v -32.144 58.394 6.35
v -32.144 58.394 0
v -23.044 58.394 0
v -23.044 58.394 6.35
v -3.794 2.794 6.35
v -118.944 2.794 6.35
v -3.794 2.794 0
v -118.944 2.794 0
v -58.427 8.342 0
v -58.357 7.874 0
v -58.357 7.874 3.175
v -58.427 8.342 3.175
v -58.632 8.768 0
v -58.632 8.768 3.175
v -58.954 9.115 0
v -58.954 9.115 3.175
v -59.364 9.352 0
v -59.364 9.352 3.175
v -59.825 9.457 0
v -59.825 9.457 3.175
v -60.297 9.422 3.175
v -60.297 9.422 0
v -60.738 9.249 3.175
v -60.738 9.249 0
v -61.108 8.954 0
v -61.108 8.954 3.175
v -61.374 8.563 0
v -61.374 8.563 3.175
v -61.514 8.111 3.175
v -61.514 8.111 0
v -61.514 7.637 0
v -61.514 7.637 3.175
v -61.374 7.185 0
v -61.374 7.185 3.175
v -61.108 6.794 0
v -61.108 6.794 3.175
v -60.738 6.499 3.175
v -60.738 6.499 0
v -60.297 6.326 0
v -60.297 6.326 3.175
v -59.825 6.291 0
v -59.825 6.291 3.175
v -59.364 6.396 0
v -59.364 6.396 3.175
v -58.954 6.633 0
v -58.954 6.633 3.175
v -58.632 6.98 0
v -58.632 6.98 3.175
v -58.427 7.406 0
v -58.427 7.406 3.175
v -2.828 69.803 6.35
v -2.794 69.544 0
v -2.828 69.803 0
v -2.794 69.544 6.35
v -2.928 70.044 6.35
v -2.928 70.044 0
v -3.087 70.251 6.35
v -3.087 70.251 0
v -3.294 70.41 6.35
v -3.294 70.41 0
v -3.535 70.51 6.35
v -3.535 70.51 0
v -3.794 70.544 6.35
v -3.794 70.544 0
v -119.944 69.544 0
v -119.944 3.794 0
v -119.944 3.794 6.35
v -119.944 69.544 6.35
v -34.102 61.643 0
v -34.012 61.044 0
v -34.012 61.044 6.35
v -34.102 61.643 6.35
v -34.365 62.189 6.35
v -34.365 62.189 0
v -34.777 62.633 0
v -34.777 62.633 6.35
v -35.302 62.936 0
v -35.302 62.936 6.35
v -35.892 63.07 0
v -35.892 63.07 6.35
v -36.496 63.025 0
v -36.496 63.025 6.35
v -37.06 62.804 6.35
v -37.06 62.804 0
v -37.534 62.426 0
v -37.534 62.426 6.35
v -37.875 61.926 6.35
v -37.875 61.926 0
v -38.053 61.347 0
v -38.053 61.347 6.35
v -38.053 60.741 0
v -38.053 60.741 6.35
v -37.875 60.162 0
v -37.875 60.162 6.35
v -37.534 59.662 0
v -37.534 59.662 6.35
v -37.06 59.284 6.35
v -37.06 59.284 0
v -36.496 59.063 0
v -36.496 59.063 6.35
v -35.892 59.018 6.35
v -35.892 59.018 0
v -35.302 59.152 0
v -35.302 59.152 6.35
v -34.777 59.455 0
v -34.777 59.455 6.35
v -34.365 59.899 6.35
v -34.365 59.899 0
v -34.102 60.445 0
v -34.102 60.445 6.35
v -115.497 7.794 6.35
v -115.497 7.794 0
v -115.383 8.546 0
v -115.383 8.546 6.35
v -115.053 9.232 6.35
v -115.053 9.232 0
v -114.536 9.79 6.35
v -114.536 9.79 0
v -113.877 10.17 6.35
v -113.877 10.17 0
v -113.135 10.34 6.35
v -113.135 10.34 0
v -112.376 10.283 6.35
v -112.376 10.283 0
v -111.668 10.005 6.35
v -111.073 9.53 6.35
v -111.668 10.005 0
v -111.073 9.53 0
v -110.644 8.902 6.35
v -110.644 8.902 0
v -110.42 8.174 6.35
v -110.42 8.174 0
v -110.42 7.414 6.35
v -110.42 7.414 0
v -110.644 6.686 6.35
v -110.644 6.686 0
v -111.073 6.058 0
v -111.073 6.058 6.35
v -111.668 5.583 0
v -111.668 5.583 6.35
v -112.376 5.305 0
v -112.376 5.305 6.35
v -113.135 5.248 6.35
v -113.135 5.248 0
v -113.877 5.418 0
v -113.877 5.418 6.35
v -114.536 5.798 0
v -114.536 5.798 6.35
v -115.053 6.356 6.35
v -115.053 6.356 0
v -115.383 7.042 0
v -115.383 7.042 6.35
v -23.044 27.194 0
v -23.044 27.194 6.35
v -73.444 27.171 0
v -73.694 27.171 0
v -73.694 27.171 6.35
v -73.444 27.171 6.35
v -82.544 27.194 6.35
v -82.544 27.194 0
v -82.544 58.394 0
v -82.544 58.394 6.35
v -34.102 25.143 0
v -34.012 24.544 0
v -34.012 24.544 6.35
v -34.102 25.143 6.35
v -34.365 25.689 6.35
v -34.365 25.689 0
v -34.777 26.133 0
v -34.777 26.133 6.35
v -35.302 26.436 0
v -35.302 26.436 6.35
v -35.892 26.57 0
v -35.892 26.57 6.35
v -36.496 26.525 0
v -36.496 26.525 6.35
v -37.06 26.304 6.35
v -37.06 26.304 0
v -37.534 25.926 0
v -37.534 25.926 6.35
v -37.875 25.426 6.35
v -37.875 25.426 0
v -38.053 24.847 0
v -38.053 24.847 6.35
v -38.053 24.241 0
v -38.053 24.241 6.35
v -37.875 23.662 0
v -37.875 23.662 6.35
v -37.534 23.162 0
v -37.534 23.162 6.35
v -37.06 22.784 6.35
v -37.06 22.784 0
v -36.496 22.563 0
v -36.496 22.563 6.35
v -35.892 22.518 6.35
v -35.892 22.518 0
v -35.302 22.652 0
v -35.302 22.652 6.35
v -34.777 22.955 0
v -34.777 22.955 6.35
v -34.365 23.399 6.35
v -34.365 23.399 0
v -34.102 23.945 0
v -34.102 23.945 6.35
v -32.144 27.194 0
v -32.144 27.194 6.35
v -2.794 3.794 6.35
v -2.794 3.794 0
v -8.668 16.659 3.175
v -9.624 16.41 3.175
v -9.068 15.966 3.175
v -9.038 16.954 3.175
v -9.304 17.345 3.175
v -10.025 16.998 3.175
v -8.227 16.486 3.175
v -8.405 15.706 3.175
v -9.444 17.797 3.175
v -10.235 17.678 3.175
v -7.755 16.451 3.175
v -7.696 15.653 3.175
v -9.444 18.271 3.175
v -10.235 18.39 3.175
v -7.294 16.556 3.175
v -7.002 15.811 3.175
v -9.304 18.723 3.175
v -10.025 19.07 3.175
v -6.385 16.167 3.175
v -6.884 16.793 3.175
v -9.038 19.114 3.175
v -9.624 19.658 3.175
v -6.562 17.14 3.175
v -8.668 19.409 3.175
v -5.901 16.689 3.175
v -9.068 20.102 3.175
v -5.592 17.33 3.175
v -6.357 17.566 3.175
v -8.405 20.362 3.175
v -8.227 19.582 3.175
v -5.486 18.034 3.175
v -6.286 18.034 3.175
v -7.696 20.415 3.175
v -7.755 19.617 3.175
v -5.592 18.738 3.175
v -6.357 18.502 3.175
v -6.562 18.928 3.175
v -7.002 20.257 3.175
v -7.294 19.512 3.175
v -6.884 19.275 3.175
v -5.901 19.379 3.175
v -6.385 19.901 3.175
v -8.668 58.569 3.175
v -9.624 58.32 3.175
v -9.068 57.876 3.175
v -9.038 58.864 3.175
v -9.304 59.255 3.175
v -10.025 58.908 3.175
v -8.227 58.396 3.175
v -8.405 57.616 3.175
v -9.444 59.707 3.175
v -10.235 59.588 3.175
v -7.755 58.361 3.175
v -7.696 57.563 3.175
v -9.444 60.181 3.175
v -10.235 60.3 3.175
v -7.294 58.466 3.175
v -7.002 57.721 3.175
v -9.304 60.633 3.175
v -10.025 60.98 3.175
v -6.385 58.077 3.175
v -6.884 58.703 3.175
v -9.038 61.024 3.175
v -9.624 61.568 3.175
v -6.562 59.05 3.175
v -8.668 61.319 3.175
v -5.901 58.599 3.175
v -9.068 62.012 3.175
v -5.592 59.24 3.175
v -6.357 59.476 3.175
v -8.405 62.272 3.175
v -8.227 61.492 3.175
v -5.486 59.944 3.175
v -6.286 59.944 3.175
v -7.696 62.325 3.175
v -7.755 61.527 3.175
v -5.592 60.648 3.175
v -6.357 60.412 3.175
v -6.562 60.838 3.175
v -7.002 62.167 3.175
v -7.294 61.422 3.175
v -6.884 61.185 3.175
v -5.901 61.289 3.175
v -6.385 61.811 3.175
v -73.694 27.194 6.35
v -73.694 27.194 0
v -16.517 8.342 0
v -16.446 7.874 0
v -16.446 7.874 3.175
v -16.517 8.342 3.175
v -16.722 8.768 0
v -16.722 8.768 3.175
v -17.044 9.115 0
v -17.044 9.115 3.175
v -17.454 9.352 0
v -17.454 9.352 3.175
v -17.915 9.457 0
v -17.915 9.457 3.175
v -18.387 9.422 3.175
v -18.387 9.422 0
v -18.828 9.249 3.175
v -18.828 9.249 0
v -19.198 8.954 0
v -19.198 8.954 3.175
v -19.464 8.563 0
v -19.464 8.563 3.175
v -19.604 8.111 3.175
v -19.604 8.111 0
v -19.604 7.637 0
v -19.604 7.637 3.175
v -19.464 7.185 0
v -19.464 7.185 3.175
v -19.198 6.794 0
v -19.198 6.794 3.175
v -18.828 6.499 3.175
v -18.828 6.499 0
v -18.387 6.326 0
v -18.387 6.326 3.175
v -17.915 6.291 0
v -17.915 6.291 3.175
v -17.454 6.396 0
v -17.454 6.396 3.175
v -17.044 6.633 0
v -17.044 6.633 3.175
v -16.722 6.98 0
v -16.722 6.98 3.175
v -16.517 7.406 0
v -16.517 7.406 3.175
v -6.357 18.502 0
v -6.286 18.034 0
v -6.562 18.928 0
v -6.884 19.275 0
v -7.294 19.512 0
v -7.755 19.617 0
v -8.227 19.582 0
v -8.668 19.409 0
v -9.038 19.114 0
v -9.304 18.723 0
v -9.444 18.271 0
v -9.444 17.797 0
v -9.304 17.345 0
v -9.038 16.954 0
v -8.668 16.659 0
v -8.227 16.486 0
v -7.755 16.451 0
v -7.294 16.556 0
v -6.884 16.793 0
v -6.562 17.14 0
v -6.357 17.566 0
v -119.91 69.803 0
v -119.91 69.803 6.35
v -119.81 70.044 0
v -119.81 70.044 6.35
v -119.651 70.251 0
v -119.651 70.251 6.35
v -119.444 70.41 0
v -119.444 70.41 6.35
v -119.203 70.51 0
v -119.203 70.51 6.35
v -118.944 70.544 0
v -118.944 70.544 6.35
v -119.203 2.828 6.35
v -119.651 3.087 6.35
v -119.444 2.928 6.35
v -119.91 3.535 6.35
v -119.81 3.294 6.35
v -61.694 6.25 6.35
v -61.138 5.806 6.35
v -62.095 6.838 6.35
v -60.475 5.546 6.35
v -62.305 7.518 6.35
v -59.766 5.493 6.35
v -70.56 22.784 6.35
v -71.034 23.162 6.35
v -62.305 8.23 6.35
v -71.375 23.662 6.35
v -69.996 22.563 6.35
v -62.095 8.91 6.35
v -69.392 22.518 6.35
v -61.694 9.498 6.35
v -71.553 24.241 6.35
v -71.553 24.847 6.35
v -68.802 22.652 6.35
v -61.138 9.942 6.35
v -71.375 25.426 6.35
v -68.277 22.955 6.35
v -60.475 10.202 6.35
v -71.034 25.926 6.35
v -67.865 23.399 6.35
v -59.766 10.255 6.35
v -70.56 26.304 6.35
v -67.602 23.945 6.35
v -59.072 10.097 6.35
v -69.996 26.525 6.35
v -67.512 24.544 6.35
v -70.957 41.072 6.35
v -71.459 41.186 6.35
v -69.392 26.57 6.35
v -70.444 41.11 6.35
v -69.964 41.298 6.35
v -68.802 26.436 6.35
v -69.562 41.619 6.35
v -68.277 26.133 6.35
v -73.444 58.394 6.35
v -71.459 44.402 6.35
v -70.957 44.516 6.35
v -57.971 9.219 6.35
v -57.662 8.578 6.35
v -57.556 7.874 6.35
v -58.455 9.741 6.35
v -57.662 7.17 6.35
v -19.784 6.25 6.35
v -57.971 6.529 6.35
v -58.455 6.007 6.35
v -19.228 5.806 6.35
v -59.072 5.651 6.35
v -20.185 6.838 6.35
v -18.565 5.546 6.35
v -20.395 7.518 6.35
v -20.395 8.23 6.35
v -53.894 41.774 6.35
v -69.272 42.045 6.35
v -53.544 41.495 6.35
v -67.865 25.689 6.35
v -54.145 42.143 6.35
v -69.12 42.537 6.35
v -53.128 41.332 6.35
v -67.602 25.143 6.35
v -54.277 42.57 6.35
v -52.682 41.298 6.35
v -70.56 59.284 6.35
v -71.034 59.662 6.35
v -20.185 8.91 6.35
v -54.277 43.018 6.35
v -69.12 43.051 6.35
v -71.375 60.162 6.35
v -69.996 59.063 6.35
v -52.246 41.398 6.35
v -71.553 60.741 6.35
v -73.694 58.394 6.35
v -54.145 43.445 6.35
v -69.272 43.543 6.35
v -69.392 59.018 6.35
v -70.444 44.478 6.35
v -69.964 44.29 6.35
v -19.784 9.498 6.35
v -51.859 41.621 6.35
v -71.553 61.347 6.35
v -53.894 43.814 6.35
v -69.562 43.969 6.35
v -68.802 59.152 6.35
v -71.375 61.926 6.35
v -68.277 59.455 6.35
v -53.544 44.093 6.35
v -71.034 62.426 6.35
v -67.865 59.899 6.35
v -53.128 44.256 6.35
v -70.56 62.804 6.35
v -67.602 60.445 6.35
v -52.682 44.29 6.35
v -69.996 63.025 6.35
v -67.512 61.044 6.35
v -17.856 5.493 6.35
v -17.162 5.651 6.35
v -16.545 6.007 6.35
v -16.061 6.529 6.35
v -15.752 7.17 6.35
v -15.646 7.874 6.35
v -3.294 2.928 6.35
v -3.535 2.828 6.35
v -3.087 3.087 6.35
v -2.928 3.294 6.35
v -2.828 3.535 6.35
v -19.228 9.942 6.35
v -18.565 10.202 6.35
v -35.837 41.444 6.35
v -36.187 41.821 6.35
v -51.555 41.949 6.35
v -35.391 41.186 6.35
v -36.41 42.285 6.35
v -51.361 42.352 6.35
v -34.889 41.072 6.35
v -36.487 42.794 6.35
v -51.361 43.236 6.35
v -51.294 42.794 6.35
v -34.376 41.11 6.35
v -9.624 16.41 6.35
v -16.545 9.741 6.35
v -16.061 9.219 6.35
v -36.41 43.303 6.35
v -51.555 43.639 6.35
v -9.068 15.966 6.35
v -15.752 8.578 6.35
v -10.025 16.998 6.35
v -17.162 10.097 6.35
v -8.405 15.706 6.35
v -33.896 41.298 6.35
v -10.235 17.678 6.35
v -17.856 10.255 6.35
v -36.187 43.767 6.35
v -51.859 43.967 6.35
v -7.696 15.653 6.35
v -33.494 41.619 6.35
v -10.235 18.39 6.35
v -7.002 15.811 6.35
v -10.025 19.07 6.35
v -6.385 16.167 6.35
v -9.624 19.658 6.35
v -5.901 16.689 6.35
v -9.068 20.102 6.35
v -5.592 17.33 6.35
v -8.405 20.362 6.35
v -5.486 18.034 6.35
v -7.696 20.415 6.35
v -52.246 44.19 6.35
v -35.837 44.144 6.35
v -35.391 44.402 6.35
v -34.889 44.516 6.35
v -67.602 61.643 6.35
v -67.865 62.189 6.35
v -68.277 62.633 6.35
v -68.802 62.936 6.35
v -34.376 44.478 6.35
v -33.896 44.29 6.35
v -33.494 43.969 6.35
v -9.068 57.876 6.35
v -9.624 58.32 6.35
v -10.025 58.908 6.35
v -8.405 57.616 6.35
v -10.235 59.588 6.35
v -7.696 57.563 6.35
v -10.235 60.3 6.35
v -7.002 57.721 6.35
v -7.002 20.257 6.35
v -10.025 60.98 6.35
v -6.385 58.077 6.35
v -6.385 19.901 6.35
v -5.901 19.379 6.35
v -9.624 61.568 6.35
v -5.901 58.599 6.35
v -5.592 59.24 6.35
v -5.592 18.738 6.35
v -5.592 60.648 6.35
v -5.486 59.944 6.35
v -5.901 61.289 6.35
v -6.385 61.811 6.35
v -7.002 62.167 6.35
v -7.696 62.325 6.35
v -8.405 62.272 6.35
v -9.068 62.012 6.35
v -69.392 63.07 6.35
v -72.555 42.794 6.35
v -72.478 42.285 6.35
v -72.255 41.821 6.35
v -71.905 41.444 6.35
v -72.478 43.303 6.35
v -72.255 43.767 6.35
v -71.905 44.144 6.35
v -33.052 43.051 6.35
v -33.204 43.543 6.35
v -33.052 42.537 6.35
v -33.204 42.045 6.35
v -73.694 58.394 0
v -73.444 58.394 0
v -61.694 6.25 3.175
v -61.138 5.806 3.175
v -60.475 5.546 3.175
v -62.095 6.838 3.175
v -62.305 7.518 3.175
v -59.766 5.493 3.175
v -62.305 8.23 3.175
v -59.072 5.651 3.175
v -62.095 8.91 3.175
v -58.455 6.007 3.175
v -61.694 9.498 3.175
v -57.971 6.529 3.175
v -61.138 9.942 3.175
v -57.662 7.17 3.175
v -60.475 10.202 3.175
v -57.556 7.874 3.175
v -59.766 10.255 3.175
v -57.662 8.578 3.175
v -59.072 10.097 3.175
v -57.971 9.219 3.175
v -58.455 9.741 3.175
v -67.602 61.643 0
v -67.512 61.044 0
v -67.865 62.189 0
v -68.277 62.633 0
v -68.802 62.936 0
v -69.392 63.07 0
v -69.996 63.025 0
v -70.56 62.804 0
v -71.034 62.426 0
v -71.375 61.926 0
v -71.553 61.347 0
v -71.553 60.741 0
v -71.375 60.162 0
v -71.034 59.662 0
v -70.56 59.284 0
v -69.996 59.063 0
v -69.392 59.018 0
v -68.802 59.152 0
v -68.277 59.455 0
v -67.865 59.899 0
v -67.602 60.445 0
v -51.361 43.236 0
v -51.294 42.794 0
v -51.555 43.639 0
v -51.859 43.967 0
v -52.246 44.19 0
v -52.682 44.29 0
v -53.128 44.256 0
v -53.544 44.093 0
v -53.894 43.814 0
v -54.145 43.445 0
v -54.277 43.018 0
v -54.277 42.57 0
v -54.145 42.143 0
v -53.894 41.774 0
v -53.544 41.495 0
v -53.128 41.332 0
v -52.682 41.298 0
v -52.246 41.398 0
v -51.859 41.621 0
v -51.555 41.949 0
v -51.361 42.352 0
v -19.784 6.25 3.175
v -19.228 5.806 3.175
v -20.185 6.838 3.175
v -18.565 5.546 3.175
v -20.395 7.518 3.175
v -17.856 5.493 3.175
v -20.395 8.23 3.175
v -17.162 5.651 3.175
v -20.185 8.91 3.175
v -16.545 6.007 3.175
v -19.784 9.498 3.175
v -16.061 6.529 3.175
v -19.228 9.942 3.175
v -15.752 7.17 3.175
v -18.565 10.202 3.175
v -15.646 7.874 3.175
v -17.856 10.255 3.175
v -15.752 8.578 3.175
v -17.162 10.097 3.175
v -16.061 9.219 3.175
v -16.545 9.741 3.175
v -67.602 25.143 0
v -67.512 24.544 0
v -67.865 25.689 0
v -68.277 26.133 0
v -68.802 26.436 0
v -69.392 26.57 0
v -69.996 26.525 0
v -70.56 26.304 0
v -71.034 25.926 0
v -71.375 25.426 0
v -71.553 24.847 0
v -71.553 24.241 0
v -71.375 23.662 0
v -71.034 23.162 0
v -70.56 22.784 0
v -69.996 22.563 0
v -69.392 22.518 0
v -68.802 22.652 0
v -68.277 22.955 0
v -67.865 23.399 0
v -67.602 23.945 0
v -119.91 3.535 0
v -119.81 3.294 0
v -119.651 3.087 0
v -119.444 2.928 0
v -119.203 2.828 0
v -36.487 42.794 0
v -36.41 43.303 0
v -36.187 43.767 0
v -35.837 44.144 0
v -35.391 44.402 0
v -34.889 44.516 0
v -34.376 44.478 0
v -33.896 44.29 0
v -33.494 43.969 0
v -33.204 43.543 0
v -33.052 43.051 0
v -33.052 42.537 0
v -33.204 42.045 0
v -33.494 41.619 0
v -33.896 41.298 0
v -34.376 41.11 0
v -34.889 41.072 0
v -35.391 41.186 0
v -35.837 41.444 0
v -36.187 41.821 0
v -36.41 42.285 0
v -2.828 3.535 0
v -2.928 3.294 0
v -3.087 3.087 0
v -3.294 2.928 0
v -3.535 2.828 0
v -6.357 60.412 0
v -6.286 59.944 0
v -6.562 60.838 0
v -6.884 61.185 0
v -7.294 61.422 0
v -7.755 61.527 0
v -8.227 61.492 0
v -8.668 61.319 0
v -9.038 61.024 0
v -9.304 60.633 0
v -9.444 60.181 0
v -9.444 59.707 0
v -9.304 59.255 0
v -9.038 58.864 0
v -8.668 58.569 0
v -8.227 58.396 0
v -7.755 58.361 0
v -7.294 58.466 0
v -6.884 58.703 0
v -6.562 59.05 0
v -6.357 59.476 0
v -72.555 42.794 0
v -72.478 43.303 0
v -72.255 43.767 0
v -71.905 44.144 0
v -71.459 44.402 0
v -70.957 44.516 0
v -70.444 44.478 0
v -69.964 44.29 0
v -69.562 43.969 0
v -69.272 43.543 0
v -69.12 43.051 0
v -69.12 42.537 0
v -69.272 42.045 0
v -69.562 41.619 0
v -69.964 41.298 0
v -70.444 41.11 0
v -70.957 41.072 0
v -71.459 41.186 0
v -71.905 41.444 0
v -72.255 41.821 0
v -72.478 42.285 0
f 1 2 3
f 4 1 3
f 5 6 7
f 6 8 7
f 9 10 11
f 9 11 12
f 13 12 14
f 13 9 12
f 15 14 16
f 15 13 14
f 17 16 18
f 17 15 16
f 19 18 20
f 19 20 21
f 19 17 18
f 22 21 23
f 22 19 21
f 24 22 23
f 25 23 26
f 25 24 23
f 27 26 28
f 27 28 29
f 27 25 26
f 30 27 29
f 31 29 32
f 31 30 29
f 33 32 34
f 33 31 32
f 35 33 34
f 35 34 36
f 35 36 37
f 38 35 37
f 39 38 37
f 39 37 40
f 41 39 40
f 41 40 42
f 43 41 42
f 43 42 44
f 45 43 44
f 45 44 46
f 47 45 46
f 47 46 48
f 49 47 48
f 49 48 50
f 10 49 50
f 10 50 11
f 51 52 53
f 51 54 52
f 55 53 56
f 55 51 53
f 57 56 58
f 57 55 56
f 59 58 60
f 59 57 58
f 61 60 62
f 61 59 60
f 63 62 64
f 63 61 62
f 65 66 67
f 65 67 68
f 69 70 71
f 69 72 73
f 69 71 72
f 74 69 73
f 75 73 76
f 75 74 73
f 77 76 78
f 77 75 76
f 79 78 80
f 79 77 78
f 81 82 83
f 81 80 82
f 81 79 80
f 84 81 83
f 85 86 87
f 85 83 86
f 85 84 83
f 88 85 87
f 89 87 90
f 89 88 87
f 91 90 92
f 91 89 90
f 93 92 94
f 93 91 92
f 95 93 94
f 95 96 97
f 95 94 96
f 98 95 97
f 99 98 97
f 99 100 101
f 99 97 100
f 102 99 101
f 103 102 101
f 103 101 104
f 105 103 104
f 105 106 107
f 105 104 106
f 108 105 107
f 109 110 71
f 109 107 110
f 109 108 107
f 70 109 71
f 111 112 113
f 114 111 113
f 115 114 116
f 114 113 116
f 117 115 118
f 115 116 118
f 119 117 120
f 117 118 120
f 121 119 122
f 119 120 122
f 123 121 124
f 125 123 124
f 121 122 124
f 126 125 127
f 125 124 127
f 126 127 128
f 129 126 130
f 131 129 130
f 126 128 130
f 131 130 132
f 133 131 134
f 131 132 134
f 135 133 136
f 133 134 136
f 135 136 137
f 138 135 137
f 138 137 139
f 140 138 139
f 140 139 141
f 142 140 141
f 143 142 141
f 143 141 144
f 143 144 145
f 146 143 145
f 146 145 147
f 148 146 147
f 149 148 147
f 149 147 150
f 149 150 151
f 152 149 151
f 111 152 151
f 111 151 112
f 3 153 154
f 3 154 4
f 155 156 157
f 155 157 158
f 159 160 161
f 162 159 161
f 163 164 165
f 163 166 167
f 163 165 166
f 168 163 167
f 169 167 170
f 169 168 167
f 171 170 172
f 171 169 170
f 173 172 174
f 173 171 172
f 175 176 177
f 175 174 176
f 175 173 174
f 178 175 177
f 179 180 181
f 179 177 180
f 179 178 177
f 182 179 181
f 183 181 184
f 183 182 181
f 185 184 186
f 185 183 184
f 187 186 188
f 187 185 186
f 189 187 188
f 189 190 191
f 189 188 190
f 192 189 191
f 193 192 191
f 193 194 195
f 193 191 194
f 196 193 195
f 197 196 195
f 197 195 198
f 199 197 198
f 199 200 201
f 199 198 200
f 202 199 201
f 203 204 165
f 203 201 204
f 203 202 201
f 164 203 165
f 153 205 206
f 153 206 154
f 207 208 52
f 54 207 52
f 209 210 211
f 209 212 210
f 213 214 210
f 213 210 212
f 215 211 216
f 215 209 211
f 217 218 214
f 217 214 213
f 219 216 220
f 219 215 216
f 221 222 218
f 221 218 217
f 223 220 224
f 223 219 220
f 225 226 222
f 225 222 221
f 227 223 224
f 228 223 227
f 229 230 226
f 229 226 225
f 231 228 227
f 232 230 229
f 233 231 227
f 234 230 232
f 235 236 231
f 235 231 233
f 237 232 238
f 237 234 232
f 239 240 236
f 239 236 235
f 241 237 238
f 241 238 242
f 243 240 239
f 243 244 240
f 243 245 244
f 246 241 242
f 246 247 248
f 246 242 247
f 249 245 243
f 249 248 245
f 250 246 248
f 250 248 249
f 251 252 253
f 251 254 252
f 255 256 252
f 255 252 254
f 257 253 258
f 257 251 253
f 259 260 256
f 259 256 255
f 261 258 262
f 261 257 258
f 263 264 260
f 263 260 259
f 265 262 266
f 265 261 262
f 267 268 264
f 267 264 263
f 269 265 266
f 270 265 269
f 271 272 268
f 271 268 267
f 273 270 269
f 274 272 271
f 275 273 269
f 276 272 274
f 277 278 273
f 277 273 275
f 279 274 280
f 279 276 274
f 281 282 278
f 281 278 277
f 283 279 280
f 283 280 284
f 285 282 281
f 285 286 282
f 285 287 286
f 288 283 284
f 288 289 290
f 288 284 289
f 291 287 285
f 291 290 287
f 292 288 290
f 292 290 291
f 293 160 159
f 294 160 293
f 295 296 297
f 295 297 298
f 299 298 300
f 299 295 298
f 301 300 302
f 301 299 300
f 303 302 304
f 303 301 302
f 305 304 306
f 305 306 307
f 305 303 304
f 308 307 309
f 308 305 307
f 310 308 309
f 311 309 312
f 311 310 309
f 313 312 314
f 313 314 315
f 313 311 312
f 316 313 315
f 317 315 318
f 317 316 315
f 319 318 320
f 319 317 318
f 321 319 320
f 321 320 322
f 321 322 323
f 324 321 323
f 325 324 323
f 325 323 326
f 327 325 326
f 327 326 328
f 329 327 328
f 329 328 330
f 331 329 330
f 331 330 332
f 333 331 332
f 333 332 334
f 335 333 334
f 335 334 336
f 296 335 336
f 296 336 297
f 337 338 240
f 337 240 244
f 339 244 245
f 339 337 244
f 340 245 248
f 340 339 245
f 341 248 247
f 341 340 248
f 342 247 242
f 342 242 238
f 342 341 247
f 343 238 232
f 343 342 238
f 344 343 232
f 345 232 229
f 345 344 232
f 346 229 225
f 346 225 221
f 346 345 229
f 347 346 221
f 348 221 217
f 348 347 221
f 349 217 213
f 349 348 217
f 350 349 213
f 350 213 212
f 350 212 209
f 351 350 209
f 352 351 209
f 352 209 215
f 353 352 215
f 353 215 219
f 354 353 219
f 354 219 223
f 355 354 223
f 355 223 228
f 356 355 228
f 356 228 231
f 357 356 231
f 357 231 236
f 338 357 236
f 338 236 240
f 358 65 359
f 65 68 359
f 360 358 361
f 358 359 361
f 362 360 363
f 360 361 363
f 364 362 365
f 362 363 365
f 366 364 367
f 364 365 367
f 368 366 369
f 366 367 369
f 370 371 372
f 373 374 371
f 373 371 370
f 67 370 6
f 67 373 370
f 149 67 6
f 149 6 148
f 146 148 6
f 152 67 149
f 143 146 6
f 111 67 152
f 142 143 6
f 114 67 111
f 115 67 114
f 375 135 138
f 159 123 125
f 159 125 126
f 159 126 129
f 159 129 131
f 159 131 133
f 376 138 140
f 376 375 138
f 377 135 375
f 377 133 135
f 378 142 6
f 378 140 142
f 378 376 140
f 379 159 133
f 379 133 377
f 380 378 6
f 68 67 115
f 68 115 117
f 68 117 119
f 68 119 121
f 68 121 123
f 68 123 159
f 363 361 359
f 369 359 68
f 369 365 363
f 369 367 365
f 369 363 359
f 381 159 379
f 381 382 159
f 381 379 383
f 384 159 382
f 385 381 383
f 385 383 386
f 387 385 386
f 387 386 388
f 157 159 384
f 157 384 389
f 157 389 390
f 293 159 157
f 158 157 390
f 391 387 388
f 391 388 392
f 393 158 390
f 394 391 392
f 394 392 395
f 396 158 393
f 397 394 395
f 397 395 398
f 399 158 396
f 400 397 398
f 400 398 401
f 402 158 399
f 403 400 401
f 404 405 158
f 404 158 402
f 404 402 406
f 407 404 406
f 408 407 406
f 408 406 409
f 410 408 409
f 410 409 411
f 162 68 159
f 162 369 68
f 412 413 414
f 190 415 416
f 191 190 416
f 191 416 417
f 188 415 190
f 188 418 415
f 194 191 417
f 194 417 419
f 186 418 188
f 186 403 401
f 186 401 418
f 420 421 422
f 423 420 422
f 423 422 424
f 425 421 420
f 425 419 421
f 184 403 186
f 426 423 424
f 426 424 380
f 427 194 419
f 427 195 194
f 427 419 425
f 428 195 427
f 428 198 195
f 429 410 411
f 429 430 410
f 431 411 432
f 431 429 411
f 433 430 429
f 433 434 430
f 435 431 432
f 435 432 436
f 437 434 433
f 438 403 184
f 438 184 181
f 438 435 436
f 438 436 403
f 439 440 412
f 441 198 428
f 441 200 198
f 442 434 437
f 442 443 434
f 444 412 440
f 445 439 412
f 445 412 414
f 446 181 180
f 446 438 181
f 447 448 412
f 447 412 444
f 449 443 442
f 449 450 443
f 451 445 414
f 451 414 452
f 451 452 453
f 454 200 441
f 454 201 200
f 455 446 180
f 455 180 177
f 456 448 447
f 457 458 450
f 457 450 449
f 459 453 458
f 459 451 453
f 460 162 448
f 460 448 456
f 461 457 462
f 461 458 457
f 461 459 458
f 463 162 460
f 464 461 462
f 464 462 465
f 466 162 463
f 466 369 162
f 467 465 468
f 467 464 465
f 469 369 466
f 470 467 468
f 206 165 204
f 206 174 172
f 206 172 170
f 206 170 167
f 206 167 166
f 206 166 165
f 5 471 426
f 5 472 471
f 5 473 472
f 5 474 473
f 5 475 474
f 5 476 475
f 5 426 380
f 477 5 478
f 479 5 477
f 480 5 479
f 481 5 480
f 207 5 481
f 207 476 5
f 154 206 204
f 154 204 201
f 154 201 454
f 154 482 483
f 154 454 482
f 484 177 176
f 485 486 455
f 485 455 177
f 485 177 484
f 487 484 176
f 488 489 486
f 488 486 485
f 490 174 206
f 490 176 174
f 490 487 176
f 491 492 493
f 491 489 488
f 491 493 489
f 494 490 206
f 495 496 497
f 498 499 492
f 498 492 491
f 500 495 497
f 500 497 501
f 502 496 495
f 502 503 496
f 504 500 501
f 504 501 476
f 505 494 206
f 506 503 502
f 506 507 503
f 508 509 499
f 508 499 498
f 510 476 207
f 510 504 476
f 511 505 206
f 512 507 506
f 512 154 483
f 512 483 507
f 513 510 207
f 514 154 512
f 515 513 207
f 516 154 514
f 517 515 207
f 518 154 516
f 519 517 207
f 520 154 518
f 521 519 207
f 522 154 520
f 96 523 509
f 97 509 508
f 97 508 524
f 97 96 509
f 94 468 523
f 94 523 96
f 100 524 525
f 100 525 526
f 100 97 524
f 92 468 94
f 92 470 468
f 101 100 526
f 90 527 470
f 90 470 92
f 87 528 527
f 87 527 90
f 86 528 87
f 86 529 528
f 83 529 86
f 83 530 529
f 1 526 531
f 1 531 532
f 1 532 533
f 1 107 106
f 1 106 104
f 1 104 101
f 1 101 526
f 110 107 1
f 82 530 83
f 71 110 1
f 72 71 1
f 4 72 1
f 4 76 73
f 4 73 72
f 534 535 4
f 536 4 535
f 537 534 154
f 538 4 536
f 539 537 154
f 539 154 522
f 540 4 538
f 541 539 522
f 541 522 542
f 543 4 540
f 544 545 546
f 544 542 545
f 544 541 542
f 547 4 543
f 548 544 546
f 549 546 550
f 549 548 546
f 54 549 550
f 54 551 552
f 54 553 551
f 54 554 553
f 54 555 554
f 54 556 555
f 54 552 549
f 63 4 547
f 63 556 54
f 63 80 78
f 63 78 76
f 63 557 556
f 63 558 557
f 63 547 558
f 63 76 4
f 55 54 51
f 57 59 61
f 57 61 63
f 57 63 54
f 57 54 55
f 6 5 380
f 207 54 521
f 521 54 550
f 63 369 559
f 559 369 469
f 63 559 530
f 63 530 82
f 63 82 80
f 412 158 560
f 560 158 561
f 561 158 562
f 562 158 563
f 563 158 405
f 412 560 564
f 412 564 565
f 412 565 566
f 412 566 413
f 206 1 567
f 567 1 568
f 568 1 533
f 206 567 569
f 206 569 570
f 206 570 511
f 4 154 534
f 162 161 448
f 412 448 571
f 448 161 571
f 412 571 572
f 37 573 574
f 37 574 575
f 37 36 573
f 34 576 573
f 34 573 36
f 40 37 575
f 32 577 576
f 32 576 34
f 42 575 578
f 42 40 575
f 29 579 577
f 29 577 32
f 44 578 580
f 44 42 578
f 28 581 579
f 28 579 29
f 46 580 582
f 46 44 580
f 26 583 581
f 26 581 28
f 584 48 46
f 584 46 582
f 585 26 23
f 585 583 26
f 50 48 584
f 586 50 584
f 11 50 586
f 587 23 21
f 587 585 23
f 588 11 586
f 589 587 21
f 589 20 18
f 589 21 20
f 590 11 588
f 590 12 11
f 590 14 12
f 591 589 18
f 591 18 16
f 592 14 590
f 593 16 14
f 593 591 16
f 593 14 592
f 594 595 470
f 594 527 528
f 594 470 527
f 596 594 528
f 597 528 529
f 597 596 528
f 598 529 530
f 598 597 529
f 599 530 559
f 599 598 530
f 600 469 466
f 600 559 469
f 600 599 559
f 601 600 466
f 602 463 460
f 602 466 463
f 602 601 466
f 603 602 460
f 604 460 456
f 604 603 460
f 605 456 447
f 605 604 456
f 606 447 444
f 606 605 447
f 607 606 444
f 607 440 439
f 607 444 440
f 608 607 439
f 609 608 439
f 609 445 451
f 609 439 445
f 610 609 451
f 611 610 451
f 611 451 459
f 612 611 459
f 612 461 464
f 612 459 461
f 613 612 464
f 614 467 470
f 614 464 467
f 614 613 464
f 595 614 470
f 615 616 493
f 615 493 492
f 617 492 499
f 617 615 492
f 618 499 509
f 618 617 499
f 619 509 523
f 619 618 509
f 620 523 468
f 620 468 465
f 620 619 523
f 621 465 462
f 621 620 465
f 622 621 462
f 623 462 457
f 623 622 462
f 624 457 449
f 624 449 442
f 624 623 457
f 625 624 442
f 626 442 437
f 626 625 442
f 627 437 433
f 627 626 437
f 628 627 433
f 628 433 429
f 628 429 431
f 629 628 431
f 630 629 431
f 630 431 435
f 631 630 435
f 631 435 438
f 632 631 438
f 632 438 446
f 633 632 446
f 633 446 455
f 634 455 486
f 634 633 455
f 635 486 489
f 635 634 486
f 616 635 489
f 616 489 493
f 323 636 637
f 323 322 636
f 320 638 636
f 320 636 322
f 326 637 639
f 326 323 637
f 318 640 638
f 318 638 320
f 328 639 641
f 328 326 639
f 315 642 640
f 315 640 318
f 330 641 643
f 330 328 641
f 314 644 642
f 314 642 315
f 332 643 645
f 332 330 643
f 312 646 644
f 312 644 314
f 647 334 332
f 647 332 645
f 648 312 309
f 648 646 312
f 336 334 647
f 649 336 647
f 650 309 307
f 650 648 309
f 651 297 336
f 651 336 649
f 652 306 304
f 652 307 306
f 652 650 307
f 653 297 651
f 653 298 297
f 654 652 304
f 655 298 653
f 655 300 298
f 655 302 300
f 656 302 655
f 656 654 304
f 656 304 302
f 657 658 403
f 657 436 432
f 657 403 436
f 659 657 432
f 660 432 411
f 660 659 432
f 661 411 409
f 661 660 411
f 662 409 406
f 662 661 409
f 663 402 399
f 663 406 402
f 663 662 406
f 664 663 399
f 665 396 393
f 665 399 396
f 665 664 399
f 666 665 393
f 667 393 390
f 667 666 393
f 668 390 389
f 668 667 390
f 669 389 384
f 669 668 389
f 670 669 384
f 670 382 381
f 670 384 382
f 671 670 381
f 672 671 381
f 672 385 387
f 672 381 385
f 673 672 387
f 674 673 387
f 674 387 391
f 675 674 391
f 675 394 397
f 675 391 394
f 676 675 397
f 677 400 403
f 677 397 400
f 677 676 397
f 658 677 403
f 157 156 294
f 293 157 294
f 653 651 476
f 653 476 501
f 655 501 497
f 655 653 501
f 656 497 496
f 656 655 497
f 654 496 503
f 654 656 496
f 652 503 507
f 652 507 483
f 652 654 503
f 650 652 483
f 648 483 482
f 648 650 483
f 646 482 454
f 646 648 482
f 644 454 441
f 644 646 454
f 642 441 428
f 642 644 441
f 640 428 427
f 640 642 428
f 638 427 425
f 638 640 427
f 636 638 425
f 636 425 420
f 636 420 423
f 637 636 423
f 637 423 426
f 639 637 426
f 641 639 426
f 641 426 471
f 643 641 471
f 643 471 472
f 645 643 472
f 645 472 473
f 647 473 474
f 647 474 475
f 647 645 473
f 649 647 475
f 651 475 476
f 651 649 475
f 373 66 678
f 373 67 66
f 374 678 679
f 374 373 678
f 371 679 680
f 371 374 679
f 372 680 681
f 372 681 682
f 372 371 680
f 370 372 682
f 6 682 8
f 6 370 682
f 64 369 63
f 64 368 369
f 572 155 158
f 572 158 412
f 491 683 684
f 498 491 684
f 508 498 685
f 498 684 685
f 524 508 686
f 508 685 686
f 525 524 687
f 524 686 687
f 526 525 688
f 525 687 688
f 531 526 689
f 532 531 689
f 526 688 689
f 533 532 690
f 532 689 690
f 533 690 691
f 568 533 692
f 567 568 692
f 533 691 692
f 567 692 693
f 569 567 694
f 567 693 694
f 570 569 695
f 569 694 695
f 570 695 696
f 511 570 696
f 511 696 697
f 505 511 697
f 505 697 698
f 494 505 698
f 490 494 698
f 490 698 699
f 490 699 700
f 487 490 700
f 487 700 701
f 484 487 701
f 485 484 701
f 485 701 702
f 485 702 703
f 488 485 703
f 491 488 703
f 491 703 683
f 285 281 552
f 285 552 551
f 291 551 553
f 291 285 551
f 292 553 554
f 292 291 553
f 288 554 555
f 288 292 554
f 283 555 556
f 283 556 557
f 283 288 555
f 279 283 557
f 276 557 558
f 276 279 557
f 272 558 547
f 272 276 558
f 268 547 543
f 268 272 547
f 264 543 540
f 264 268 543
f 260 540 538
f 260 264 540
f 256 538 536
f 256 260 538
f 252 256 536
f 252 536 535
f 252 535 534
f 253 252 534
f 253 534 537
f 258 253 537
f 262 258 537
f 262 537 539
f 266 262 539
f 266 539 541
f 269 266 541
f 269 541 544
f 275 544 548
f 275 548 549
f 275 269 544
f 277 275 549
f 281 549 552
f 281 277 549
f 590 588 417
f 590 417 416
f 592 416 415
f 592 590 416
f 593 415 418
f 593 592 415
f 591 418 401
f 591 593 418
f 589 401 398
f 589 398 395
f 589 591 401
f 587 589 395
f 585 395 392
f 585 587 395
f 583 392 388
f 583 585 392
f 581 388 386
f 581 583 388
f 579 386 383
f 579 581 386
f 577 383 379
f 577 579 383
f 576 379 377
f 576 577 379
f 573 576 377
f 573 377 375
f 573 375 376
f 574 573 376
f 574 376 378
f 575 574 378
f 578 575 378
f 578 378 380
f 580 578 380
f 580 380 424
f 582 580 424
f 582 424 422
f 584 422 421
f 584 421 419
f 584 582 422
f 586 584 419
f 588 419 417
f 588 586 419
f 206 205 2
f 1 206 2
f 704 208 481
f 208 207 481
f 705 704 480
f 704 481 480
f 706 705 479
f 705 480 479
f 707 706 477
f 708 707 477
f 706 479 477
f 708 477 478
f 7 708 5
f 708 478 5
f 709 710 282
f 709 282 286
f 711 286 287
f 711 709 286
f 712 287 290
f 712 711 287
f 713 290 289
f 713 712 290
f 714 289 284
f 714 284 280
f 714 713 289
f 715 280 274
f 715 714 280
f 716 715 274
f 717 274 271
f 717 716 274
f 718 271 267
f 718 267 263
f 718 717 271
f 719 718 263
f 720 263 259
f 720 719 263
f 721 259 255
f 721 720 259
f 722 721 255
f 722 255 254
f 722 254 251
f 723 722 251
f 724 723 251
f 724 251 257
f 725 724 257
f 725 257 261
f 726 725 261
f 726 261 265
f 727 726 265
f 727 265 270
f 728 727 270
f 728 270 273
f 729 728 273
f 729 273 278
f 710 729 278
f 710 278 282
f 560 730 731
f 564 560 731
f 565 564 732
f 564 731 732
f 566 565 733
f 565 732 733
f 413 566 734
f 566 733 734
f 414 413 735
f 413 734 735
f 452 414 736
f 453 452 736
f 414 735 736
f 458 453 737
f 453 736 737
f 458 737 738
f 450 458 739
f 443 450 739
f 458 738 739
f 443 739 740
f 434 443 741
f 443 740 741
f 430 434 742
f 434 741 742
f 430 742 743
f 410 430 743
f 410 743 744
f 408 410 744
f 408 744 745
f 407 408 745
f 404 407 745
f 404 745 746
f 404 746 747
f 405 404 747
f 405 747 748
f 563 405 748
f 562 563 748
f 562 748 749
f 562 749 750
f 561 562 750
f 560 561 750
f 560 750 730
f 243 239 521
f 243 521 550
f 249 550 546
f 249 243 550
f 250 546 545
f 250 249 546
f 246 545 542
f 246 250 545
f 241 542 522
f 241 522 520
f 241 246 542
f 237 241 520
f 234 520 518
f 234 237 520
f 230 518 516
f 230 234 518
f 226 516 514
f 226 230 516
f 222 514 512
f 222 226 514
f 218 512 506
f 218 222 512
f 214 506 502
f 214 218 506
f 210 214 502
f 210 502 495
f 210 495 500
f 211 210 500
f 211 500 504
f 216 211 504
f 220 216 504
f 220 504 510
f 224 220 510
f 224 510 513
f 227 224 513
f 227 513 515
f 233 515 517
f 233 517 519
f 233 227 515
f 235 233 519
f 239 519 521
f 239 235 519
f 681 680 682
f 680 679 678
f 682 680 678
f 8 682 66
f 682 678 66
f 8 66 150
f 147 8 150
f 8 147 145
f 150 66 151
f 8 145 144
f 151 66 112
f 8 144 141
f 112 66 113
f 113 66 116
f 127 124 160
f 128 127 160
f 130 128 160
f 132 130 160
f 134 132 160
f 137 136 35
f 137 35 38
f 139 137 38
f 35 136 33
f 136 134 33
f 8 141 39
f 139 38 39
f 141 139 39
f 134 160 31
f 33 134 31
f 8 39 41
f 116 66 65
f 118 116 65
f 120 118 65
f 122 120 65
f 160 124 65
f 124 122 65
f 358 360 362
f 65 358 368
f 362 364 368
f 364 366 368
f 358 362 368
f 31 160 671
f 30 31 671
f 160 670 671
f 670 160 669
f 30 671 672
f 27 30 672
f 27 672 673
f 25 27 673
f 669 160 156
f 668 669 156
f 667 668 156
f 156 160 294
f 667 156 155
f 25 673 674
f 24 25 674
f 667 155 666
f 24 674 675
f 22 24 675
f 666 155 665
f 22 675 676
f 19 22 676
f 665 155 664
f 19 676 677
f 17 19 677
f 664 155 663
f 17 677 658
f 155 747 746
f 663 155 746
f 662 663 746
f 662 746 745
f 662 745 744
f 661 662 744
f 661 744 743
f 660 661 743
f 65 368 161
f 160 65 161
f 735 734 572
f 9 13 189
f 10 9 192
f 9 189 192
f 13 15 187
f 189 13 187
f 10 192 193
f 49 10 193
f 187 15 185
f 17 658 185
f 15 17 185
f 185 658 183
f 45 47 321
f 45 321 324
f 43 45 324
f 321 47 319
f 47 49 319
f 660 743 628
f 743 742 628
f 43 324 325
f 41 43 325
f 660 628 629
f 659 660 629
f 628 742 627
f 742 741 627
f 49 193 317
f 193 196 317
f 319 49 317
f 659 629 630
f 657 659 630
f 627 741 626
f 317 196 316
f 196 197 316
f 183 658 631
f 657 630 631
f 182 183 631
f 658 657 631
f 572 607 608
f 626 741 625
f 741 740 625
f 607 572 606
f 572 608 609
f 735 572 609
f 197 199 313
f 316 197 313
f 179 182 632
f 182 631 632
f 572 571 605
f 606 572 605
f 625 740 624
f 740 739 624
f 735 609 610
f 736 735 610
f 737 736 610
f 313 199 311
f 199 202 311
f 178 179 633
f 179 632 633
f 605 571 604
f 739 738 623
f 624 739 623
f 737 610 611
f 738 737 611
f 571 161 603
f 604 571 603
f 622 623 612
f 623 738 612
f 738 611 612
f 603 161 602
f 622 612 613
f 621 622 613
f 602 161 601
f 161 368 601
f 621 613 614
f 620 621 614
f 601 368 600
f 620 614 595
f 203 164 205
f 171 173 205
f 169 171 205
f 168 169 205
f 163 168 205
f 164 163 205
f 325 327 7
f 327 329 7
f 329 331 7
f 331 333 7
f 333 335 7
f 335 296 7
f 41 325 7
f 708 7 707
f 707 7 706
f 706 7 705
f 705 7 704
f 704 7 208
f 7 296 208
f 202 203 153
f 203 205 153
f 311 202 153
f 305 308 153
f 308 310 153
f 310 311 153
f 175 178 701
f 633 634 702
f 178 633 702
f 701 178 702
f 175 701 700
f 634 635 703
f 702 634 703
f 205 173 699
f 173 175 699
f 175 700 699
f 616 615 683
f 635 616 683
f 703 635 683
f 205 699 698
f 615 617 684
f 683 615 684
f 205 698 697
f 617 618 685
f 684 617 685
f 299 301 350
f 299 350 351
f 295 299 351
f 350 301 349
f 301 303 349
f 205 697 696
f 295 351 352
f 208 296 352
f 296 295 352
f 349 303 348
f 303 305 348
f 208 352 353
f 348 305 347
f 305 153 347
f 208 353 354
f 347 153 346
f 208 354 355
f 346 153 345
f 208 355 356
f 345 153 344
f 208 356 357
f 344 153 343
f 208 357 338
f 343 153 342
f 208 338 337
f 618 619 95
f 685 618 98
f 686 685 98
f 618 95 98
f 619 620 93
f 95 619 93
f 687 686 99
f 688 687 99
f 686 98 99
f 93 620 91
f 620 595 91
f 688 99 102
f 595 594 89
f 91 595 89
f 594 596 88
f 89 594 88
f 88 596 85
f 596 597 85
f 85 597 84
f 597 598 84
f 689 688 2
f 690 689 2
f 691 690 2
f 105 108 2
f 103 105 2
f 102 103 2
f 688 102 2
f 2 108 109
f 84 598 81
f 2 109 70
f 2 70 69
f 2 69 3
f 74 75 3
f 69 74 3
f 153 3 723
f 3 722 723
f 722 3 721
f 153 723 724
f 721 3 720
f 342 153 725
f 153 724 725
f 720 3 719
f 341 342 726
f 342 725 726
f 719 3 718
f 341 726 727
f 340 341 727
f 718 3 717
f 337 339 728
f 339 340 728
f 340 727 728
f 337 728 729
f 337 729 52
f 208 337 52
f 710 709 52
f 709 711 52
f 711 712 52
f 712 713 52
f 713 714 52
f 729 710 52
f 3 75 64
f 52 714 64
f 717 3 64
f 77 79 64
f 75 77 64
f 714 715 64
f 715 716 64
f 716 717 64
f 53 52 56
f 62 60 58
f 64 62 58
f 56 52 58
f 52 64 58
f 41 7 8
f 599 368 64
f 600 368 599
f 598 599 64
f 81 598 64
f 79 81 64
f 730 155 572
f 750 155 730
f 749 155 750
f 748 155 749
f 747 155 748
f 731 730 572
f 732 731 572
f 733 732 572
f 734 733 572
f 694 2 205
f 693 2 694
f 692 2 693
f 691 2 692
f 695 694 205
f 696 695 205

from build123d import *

# Parameters (mm, degrees)
SKETCH5_W               = 91.75
SKETCH5_H               = 67.75
SKETCH5_R               = 2.3876
SKETCH5_R_2             = 3.683
SKETCH5_R_3             = 1.5
SKETCH5_W_2             = 8.85
SKETCH5_H_2             = 31.2
SKETCH5_R_4             = 1.5875
BOSS_EXTRUDE1_DEPTH     = 6.35
F_8_32_TAPPED_HOLE1_D   = 3.4544
CUT_EXTRUDE2_START      = 3.175
SKETCH5_3_R             = 2.3876
SKETCH5_3_R_2           = 1.5875
CUT_EXTRUDE2_DEPTH      = 3.175
SKETCH8_W               = 25.4
SKETCH8_H               = 67.75
SKETCH8_R               = 1
BOSS_EXTRUDE2_DEPTH     = 6.35
F_1_4_20_TAPPED_HOLE2_D = 5.1054
CUT_EXTRUDE3_DEPTH      = 140.2958778
CUT_EXTRUDE3_DEPTH_BACK = 140.2958778
SKETCH11_R              = 2.032
CUT_EXTRUDE4_DEPTH      = 140.2958778
CUT_EXTRUDE4_DEPTH_BACK = 140.2958778
SKETCH12_W              = 0.25
SKETCH12_H              = 31.2
SKETCH12_H_2            = 31.222616973
FILLET2_R               = 1


with BuildPart() as part:
    # Sketch5 → Boss-Extrude1 (new body)
    # profile 1 of 6: a face of its own
    with BuildSketch(Plane.XY):
        with Locations((-48.669, 36.669)):
            Rectangle(SKETCH5_W, SKETCH5_H)
        with Locations((-7.874, 18.034)):
            Circle(SKETCH5_R, mode=Mode.SUBTRACT)
        with Locations((-7.874, 59.944)):
            Circle(SKETCH5_R, mode=Mode.SUBTRACT)
        with Locations((-18.034, 7.874)):
            Circle(SKETCH5_R, mode=Mode.SUBTRACT)
        with Locations((-59.944, 7.874)):
            Circle(SKETCH5_R, mode=Mode.SUBTRACT)
        with Locations((-19.9136, 19.9136)):
            Circle(SKETCH5_R_2, mode=Mode.SUBTRACT)
        with Locations((-52.794, 42.794)):
            Circle(SKETCH5_R_3, mode=Mode.SUBTRACT)
        with Locations((-78.119, 42.794)):
            Rectangle(SKETCH5_W_2, SKETCH5_H_2, mode=Mode.SUBTRACT)
        with Locations((-27.469, 42.794)):
            Rectangle(SKETCH5_W_2, SKETCH5_H_2, mode=Mode.SUBTRACT)
    # profile 2 of 6: a face of its own
    with BuildSketch(Plane.XY):
        with Locations((-7.874, 59.944)):
            Circle(SKETCH5_R)
        with Locations((-7.874, 59.944)):
            Circle(SKETCH5_R_4, mode=Mode.SUBTRACT)
    # profile 3 of 6: a face of its own
    with BuildSketch(Plane.XY):
        with Locations((-19.9136, 19.9136)):
            Circle(SKETCH5_R_2)
    # profile 4 of 6: a face of its own
    with BuildSketch(Plane.XY):
        with Locations((-7.874, 18.034)):
            Circle(SKETCH5_R)
        with Locations((-7.874, 18.034)):
            Circle(SKETCH5_R_4, mode=Mode.SUBTRACT)
    # profile 5 of 6: a face of its own
    with BuildSketch(Plane.XY):
        with Locations((-18.034, 7.874)):
            Circle(SKETCH5_R)
        with Locations((-18.034, 7.874)):
            Circle(SKETCH5_R_4, mode=Mode.SUBTRACT)
    # profile 6 of 6: a face of its own
    with BuildSketch(Plane.XY):
        with Locations((-59.944, 7.874)):
            Circle(SKETCH5_R)
        with Locations((-59.944, 7.874)):
            Circle(SKETCH5_R_4, mode=Mode.SUBTRACT)
    extrude(amount=BOSS_EXTRUDE1_DEPTH)

    # #8-32 Tapped Hole1 (through all)
    with Locations(Plane(origin=(-70.828, 42.794, 6.35), x_dir=(1, 0, 0), z_dir=(0, 0, 1))):
        with Locations((0, 0), (36.068, 0)):
            Hole(F_8_32_TAPPED_HOLE1_D / 2)

    # Sketch5<3> → Cut-Extrude2 (cut)
    # profile 1 of 4: a face of its own
    with BuildSketch(Plane.XY.offset(CUT_EXTRUDE2_START)):
        with Locations((-18.034, 7.874)):
            Circle(SKETCH5_3_R)
        with Locations((-18.034, 7.874)):
            Circle(SKETCH5_3_R_2, mode=Mode.SUBTRACT)
    # profile 2 of 4: a face of its own
    with BuildSketch(Plane.XY.offset(CUT_EXTRUDE2_START)):
        with Locations((-7.874, 18.034)):
            Circle(SKETCH5_3_R)
        with Locations((-7.874, 18.034)):
            Circle(SKETCH5_3_R_2, mode=Mode.SUBTRACT)
    # profile 3 of 4: a face of its own
    with BuildSketch(Plane.XY.offset(CUT_EXTRUDE2_START)):
        with Locations((-59.944, 7.874)):
            Circle(SKETCH5_3_R)
        with Locations((-59.944, 7.874)):
            Circle(SKETCH5_3_R_2, mode=Mode.SUBTRACT)
    # profile 4 of 4: a face of its own
    with BuildSketch(Plane.XY.offset(CUT_EXTRUDE2_START)):
        with Locations((-7.874, 59.944)):
            Circle(SKETCH5_3_R)
        with Locations((-7.874, 59.944)):
            Circle(SKETCH5_3_R_2, mode=Mode.SUBTRACT)
    extrude(amount=CUT_EXTRUDE2_DEPTH, mode=Mode.SUBTRACT)

    # Sketch8 → Boss-Extrude2 (add)
    with BuildSketch(Plane.XY):
        with Locations((-107.244, 36.669)):
            Rectangle(SKETCH8_W, SKETCH8_H)
        with Locations((-112.944, 7.794)):
            Circle(SKETCH8_R, mode=Mode.SUBTRACT)
    extrude(amount=BOSS_EXTRUDE2_DEPTH)

    # 1/4-20 Tapped Hole2 (through all)
    with Locations(Plane(origin=(-112.944, 7.794, 6.35), x_dir=(1, 0, 0), z_dir=(0, 0, 1))):
        with Locations((0, 0)):
            Hole(F_1_4_20_TAPPED_HOLE2_D / 2)

    # Sketch11 → Cut-Extrude3 (cut, two sides: drawn at the far end of the back side and taken through both)
    with BuildSketch(Plane.XY.offset(6.35).offset(-CUT_EXTRUDE3_DEPTH_BACK)):
        with Locations((-69.544, 61.044)):
            Circle(SKETCH11_R)
        with Locations((-36.044, 61.044)):
            Circle(SKETCH11_R)
        with Locations((-36.044, 24.544)):
            Circle(SKETCH11_R)
        with Locations((-69.544, 24.544)):
            Circle(SKETCH11_R)
    extrude(amount=CUT_EXTRUDE3_DEPTH + CUT_EXTRUDE3_DEPTH_BACK, mode=Mode.SUBTRACT)

    # Sketch12 → Cut-Extrude4 (cut, two sides: drawn at the far end of the back side and taken through both)
    with BuildSketch(Plane.XY.offset(6.35).offset(-CUT_EXTRUDE4_DEPTH_BACK)):
        with Locations((-32.019, 42.794)):
            Rectangle(SKETCH12_W, SKETCH12_H)
        with Locations((-73.569, 42.782691514)):
            Rectangle(SKETCH12_W, SKETCH12_H_2)
    extrude(amount=CUT_EXTRUDE4_DEPTH + CUT_EXTRUDE4_DEPTH_BACK, mode=Mode.SUBTRACT)

    # Fillet2
    fillet2_edges = [part.edges().sort_by_distance(p)[0] for p in [
        (-119.944, 70.544, 3.175),
        (-2.794, 2.794, 3.175),
        (-2.794, 70.544, 3.175),
        (-119.944, 2.794, 3.175),
    ]]
    fillet(fillet2_edges, radius=FILLET2_R)


solid = part.part
